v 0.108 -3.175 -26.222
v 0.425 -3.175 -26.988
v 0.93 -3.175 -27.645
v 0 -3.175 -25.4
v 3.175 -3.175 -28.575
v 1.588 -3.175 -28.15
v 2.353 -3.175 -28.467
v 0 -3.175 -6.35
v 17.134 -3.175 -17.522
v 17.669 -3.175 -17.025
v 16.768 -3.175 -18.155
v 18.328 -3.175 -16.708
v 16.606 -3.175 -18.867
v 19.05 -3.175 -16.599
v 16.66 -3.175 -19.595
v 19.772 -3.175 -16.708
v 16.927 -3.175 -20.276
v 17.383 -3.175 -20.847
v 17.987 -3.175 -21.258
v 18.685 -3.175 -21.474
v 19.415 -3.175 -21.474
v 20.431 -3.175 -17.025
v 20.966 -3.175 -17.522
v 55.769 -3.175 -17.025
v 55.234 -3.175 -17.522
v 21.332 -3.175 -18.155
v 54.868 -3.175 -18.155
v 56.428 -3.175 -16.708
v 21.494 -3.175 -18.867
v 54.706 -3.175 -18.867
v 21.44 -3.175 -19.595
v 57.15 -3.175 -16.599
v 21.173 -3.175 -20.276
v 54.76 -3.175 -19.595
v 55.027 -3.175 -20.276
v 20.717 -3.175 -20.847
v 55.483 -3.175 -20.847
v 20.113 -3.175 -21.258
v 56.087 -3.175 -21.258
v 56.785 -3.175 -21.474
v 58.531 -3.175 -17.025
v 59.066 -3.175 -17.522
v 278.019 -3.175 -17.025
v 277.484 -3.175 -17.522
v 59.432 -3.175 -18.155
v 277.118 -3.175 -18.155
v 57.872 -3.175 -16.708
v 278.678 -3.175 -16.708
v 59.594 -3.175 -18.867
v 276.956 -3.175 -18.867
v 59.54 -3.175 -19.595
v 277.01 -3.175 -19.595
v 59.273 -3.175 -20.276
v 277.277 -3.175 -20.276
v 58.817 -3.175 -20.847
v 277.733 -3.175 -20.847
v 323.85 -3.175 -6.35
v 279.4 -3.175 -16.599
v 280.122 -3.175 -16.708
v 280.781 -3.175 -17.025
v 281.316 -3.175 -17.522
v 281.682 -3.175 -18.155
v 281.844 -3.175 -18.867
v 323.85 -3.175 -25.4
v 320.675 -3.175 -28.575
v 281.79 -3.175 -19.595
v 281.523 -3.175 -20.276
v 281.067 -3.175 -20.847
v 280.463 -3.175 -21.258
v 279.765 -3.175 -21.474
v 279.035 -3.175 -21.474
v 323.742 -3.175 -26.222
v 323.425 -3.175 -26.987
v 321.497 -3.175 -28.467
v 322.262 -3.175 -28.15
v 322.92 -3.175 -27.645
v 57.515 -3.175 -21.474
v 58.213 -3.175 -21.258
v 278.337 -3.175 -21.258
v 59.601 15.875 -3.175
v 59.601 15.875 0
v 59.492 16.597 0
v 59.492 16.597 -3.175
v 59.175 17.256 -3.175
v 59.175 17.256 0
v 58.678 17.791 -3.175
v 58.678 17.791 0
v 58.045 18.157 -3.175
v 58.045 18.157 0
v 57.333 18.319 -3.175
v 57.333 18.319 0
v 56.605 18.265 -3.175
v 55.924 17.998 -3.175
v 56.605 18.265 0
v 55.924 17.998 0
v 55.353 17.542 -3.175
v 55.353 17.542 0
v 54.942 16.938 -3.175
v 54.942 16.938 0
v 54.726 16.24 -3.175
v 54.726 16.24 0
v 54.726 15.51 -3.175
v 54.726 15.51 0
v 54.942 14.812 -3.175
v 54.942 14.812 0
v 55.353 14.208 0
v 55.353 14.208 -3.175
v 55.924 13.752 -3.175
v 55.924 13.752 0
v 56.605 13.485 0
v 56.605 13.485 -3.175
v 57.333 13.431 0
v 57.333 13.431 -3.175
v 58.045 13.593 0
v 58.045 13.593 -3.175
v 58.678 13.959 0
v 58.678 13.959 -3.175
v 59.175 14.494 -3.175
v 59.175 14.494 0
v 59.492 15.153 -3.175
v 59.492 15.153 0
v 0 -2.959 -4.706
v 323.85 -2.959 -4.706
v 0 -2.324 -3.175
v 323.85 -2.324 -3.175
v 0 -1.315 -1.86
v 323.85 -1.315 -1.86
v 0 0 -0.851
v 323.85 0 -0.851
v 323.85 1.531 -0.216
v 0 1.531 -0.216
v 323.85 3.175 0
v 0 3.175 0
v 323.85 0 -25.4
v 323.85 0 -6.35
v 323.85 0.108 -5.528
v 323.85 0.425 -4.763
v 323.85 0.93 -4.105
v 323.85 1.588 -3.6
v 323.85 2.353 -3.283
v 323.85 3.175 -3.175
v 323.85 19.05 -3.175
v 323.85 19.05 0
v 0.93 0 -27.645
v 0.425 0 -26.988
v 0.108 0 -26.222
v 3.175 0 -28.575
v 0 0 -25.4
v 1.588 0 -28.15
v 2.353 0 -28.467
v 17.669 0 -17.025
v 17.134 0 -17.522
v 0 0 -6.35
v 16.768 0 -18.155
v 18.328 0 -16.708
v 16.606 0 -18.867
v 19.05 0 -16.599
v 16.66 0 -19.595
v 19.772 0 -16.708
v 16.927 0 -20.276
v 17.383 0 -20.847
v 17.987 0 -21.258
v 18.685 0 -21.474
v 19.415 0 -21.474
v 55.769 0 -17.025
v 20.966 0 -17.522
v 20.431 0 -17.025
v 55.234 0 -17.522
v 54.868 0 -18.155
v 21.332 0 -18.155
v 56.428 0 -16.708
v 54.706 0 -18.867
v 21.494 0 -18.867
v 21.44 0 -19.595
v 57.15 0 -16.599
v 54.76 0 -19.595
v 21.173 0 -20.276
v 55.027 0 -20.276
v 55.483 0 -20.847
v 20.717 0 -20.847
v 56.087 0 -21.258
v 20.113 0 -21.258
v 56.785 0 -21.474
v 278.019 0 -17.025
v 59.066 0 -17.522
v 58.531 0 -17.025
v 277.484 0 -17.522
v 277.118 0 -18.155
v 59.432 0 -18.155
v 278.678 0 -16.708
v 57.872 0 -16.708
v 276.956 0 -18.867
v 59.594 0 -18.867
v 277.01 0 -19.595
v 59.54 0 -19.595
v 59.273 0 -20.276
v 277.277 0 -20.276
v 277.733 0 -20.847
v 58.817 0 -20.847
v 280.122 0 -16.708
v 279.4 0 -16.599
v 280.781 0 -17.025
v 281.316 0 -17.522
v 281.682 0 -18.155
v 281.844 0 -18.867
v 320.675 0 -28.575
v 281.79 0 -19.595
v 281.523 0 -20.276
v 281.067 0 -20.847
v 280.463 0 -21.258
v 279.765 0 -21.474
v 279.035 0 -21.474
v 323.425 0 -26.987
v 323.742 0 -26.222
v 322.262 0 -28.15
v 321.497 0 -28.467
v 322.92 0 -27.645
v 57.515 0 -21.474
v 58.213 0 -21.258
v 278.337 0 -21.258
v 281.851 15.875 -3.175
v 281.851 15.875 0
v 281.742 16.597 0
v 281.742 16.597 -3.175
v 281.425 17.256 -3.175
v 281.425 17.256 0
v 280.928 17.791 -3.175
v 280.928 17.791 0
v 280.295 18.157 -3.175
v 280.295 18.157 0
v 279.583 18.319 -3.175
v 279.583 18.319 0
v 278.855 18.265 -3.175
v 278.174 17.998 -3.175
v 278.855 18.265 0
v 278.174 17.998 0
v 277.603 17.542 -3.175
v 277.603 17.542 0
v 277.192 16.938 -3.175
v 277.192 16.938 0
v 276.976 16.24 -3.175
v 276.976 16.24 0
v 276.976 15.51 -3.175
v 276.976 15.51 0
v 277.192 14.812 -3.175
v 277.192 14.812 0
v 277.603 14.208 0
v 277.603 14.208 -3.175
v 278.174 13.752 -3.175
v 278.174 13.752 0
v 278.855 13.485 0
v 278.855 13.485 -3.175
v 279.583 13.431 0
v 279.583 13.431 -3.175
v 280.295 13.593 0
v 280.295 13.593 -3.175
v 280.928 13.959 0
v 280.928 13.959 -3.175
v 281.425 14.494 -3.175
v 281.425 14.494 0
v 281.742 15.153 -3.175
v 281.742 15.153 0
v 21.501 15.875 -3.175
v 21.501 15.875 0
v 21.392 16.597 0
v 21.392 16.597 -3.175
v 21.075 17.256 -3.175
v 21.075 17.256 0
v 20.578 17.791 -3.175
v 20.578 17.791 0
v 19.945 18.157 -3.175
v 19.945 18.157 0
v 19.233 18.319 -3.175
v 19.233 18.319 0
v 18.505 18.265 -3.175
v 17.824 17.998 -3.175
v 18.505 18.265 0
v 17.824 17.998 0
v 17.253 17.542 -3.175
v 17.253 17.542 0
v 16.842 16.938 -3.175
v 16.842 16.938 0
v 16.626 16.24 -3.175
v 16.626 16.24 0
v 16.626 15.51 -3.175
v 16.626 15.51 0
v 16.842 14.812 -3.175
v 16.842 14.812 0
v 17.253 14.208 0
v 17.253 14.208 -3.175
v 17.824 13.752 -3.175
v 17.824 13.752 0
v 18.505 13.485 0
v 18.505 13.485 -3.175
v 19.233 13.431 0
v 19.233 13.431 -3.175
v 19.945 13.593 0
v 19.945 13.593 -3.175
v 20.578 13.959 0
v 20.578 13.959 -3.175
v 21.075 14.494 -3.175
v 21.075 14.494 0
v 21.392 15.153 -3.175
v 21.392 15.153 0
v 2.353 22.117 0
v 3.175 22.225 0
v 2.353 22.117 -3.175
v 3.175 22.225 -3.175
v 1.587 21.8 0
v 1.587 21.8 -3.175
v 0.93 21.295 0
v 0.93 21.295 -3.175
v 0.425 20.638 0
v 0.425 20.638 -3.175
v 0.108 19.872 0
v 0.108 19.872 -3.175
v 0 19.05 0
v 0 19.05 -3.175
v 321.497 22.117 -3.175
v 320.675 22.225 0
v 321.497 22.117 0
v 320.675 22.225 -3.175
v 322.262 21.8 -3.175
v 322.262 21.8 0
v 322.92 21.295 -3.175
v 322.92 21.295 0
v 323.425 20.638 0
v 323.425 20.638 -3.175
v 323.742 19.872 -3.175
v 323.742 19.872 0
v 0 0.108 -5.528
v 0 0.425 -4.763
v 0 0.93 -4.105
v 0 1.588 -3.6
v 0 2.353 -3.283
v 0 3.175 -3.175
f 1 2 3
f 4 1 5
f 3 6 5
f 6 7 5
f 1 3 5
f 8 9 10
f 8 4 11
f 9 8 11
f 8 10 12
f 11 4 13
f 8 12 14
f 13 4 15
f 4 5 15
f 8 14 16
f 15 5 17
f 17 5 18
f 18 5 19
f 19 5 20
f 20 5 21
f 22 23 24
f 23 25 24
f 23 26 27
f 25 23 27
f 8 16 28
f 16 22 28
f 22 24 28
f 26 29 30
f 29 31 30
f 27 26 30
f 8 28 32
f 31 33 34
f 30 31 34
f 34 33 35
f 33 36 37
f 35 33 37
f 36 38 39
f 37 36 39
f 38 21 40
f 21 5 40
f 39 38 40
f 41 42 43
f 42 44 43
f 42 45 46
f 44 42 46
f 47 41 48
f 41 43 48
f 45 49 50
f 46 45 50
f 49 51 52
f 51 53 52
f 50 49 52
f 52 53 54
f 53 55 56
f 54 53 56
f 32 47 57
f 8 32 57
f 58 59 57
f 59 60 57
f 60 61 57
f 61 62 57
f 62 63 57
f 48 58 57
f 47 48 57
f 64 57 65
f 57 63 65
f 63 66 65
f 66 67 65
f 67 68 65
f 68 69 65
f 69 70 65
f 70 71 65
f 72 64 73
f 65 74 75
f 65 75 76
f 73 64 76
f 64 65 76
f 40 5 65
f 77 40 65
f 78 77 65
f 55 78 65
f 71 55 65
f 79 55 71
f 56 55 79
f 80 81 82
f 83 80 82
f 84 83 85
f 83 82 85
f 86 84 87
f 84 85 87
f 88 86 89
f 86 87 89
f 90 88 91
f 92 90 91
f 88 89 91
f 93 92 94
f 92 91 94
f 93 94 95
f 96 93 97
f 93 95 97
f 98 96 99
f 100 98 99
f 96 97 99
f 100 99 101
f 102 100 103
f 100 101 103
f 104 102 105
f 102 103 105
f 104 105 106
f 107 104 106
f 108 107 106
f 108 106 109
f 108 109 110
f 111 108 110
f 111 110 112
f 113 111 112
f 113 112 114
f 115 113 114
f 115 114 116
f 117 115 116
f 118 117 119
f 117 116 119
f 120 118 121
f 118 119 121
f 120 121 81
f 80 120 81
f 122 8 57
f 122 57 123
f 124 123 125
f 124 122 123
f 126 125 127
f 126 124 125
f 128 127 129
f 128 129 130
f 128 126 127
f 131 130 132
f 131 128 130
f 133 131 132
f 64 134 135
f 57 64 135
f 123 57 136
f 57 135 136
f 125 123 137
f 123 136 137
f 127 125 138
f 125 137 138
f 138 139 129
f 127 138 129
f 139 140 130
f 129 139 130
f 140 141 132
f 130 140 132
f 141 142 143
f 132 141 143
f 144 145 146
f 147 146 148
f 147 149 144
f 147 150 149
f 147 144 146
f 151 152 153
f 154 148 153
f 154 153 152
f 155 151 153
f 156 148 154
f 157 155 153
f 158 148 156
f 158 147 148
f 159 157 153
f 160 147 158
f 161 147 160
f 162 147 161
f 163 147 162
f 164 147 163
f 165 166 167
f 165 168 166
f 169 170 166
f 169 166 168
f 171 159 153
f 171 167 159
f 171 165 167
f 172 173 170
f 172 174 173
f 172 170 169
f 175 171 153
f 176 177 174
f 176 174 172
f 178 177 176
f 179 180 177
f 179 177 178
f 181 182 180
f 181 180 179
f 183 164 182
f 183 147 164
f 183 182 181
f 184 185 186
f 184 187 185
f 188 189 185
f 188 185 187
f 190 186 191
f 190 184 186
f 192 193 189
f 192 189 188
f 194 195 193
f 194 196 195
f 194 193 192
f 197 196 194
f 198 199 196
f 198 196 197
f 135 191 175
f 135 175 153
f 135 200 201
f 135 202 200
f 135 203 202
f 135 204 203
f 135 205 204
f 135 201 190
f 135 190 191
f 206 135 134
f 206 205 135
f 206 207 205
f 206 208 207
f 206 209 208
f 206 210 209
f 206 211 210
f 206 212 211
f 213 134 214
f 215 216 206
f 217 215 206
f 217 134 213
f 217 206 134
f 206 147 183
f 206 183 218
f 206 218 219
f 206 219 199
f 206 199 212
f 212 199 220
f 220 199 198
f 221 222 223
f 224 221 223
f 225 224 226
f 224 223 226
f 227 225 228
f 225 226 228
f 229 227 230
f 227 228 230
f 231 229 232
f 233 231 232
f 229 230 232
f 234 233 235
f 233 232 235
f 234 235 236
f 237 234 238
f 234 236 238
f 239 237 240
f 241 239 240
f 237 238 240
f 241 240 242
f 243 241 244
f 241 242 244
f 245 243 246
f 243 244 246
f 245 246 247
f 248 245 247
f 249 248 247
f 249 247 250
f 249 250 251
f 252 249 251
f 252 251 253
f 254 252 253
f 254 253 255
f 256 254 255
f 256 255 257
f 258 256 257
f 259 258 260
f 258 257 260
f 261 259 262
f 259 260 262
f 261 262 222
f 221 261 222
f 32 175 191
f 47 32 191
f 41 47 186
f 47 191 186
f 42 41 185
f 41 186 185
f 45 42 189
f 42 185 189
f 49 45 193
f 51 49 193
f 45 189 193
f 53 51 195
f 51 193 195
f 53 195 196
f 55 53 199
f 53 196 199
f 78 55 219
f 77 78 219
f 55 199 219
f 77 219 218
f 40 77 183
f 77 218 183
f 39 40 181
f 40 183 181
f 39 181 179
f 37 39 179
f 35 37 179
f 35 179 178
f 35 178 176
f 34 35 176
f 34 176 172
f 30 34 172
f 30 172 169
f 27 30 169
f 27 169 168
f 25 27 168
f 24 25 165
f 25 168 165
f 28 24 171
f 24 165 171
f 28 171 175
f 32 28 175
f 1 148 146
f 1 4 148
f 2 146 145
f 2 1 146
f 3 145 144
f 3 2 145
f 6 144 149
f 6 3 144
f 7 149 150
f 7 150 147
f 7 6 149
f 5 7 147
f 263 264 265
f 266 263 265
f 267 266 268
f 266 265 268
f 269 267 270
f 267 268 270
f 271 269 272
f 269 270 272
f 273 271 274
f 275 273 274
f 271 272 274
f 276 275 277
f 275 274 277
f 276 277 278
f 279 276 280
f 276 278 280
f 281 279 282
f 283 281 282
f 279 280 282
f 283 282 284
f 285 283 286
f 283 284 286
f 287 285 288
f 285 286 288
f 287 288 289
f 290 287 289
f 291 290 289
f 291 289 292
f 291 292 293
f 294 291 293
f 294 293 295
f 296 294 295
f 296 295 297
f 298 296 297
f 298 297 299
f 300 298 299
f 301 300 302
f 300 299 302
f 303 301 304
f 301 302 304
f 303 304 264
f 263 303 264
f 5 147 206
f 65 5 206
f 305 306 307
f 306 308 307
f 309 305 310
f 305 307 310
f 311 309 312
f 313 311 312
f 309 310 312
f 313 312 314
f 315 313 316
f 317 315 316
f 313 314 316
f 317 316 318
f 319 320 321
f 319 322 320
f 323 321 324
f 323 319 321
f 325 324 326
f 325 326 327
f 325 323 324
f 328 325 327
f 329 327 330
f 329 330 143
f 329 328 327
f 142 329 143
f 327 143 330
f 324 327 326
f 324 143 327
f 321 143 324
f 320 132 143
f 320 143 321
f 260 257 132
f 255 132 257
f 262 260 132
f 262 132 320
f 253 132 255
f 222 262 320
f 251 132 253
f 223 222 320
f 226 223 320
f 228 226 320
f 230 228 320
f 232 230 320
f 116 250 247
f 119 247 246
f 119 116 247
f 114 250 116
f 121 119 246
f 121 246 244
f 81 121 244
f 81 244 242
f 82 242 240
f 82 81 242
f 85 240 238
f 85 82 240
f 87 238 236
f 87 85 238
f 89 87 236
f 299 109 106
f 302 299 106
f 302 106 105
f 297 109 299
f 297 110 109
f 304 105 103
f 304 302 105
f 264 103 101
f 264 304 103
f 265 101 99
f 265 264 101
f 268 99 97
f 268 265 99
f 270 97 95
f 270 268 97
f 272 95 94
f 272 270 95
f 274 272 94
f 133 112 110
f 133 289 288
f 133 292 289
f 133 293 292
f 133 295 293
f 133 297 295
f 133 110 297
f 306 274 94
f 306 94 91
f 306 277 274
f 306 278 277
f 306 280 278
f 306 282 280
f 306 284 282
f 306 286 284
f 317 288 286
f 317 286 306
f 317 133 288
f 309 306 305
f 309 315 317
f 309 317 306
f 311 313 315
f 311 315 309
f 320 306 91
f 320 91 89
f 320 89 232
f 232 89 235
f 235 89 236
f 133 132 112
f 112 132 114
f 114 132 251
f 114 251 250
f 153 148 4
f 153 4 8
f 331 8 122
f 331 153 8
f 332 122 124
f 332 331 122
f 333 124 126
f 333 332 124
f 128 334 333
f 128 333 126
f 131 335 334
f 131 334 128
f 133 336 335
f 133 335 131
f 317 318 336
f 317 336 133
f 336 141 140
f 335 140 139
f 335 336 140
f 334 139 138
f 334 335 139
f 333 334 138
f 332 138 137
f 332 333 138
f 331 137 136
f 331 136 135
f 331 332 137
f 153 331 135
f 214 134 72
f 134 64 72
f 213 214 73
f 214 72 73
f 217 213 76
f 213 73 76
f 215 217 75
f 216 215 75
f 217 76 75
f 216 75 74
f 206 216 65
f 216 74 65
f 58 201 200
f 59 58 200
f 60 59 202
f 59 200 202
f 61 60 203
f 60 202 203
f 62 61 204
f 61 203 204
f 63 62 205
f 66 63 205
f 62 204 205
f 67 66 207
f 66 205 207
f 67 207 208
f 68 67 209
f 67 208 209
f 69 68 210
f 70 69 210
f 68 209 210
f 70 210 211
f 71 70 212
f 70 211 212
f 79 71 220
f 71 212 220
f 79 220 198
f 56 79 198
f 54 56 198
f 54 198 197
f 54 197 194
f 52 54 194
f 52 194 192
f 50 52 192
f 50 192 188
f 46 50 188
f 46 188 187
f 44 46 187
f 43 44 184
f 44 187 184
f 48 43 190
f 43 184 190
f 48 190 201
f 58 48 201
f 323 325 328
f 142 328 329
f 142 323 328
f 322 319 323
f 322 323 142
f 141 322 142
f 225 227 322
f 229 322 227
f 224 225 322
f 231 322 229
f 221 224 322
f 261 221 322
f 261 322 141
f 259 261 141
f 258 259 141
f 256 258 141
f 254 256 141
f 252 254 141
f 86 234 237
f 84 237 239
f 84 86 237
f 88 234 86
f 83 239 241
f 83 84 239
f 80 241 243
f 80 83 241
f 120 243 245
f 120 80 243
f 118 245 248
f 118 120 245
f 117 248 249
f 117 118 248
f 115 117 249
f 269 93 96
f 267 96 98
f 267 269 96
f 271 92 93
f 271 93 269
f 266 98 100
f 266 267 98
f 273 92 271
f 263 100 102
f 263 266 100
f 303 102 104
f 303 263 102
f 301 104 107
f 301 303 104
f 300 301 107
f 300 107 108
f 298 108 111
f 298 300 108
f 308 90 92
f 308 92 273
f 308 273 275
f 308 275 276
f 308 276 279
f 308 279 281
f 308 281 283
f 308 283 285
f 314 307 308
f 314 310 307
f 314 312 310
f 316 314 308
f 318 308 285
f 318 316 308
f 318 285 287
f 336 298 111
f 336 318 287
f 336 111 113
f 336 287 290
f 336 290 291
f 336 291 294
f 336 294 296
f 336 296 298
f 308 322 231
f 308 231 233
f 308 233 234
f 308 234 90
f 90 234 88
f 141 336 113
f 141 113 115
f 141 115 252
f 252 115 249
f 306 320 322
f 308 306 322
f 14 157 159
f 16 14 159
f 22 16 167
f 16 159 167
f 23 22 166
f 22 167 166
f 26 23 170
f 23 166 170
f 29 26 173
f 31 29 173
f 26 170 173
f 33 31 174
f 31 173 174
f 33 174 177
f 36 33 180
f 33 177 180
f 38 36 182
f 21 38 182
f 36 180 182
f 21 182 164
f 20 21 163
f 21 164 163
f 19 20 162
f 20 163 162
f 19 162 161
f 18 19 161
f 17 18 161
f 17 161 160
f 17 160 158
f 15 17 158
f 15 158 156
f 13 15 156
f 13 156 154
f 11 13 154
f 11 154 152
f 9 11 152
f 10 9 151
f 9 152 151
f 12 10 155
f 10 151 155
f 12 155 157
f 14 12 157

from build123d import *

# Parameters (mm, degrees)
SKETCH9_W                    = 323.85
SKETCH9_H                    = 28.575
BASE_FLANGE2_DEPTH           = 3.175
EDGE_FLANGE1_STRIP_W         = 19.05
EDGE_FLANGE1_STRIP_H         = 3.175
EDGE_FLANGE1_STRIP_CUT_DEPTH = 323.85
EDGE_FLANGE1_DEPTH           = 323.85
SKETCH15_R                   = 2.4511
CUT_EXTRUDE1_DEPTH           = 3.175
FILLET1_R                    = 3.175
SKETCH16_R                   = 2.4511
CUT_EXTRUDE2_DEPTH           = 3.175


# Sheet-metal steps are written as plain solids
with BuildPart() as part:
    # Sketch9 → Base-Flange2 (new body)
    with BuildSketch(Plane(origin=(0, 0, 0), x_dir=(1, 0, 0), z_dir=(0, 1, 0))):
        with Locations((161.925, 14.2875)):
            Rectangle(SKETCH9_W, SKETCH9_H)
    extrude(amount=-BASE_FLANGE2_DEPTH)

    # Edge-Flange1 strip (across the edge) → Edge-Flange1 strip cut (cut)
    with BuildSketch(Plane(origin=(0, 0, 0), x_dir=(0, 0, -1), z_dir=(1, 0, 0))):
        with Locations((-3.175, -1.5875)):
            Rectangle(EDGE_FLANGE1_STRIP_W, EDGE_FLANGE1_STRIP_H)
    extrude(amount=EDGE_FLANGE1_STRIP_CUT_DEPTH, mode=Mode.SUBTRACT)

    # Edge-Flange1 section (across the edge) → Edge-Flange1 (add)
    with BuildSketch(Plane(origin=(0, 0, 0), x_dir=(0, 0, -1), z_dir=(1, 0, 0))):
        with BuildLine():
            Line((0, 3.175), (0, 22.225))
            Line((0, 22.225), (3.175, 22.225))
            Line((3.175, 22.225), (3.175, 3.175))
            ThreePointArc((3.175, 3.175), (4.10493597, 0.92993597), (6.35, 0))
            Line((6.35, 0), (6.35, -3.175))
            ThreePointArc((6.35, -3.175), (1.859871939, -1.315128061), (0, 3.175))
        make_face()
    extrude(amount=EDGE_FLANGE1_DEPTH)

    # Sketch15 → Cut-Extrude1 (cut)
    with BuildSketch(Plane(origin=(0, 0, 0), x_dir=(1, 0, 0), z_dir=(0, 1, 0))):
        with Locations(Location((19.05, 19.05, 0), (0, 0, 270))):
            Circle(SKETCH15_R)
        with Locations(Location((57.15, 19.05, 0), (0, 0, 270))):
            Circle(SKETCH15_R)
        with Locations(Location((279.4, 19.05, 0), (0, 0, 270))):
            Circle(SKETCH15_R)
        with Locations((501.65, 19.05)):
            Circle(SKETCH15_R)
    extrude(amount=-CUT_EXTRUDE1_DEPTH, mode=Mode.SUBTRACT)

    # Fillet1
    fillet1_edges = [part.edges().sort_by_distance(p)[0] for p in [
        (0, 22.225, -1.5875),
        (323.85, 22.225, -1.5875),
        (0, -1.5875, -28.575),
        (323.85, -1.5875, -28.575),
    ]]
    fillet(fillet1_edges, radius=FILLET1_R)

    # Sketch16 → Cut-Extrude2 (cut)
    with BuildSketch(Plane.XY):
        with Locations((19.05, 15.875)):
            Circle(SKETCH16_R)
        with Locations((57.15, 15.875)):
            Circle(SKETCH16_R)
        with Locations((279.4, 15.875)):
            Circle(SKETCH16_R)
    extrude(amount=-CUT_EXTRUDE2_DEPTH, mode=Mode.SUBTRACT)


solid = part.part
